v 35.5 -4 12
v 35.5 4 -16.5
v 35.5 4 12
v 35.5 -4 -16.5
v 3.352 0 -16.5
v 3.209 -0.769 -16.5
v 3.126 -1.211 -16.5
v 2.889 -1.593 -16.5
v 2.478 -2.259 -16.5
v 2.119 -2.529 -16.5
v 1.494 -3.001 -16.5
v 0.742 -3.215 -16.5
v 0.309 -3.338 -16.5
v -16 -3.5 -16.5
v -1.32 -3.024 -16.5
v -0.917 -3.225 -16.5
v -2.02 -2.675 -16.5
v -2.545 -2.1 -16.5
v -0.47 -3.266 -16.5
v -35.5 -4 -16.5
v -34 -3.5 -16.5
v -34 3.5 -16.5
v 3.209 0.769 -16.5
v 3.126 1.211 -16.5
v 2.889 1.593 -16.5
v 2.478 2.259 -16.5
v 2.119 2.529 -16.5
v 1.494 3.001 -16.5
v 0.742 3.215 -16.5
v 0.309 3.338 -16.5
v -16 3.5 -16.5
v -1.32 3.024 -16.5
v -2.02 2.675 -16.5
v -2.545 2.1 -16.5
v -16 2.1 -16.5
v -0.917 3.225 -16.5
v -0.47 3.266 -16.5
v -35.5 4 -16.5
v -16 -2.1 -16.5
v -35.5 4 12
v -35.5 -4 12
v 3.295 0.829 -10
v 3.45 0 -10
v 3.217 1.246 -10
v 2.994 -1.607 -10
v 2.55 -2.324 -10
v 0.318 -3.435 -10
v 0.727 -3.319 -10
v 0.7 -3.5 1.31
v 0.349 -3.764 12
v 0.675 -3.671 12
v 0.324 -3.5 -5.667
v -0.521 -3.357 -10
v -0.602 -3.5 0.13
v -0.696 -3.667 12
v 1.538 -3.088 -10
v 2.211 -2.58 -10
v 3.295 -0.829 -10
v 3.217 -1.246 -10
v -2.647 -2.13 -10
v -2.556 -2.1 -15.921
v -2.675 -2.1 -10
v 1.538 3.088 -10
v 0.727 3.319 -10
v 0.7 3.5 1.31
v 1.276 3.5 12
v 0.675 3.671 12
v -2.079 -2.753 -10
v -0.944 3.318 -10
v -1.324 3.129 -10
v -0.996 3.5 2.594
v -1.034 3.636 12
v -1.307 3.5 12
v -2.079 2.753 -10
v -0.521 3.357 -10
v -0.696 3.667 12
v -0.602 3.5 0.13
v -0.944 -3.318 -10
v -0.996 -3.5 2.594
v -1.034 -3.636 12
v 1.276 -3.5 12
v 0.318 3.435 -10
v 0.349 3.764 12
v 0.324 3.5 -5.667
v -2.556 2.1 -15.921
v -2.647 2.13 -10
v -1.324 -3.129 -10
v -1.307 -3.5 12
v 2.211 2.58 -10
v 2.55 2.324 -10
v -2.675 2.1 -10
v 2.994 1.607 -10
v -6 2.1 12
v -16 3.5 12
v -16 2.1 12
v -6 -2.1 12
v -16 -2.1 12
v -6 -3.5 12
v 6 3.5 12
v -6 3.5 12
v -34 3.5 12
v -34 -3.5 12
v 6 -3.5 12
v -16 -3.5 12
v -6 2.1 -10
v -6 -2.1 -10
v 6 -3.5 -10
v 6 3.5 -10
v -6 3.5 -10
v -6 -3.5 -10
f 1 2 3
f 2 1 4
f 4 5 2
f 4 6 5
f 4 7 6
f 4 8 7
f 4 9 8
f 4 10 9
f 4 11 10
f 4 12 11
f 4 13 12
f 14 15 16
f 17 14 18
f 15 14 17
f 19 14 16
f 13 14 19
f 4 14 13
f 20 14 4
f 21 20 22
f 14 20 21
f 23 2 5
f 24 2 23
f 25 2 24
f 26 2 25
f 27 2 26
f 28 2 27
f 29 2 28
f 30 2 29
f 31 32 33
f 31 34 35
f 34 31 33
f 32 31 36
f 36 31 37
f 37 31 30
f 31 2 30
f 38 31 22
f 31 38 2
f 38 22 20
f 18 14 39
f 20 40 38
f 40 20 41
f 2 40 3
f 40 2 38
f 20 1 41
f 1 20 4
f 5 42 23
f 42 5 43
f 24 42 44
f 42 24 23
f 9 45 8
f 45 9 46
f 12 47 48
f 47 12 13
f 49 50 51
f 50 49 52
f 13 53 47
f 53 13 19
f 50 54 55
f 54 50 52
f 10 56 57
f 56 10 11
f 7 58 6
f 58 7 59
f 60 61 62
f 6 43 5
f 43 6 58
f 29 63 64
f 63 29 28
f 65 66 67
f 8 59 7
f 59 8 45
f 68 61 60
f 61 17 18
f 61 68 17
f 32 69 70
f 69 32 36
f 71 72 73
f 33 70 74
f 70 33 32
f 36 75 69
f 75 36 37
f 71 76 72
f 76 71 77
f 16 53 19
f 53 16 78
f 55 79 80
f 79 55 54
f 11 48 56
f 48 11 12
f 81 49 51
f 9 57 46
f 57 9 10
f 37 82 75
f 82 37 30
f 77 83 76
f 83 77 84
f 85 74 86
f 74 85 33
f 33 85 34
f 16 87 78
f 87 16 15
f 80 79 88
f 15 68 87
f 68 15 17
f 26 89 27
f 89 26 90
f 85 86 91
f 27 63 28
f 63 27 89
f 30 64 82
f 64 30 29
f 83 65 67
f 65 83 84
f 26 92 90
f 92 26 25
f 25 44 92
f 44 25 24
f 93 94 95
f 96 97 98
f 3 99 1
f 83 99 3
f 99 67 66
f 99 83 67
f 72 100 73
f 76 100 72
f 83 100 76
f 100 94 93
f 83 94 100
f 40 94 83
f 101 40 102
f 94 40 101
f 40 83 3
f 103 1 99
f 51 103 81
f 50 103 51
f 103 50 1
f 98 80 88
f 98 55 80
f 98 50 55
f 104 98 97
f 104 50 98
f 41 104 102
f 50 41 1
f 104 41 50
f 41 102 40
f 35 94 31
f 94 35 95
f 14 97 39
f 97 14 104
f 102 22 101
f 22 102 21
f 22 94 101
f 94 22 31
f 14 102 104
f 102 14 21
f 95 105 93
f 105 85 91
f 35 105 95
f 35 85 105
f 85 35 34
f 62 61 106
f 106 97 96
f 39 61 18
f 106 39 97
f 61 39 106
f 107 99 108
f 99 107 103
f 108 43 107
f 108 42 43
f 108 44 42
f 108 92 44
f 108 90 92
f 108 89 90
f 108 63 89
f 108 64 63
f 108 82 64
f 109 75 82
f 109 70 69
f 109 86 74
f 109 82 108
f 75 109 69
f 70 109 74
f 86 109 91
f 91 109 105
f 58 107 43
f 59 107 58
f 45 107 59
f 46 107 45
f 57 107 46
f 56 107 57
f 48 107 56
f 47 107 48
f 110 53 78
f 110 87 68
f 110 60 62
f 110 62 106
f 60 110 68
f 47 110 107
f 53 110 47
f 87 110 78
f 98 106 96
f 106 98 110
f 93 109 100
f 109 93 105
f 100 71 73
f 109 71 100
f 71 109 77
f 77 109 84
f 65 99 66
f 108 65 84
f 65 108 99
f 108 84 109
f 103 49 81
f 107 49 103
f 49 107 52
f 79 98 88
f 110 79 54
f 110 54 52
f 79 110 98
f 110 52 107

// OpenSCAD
/* [Global] */
// preview[view:north west, tilt:top]
/* [Bracket Arm] */
angle = 0; // [-90:90]
bracketLength = 20;
bracket = 1; //[0:Hide,1:Show]
bracketOffset = 0;
part = "Adapter"; // [Bracket:Modify Bracket,Adapter:Modify Adapter]

/* [Model Angle] */
//Rotate the model so it lays flay on the build surface
modelAngle = 0; // [360]
/* [USB End] */

//USB Port Sizes
usbCWidth = 7;
usbCLength = 12;
usbCHeight = 23;

/* [USB Cable] */

//USB Cable Sizes
usbCCableDiamiter = 4; // [2.0:8]
usbCCableShroudDiamiter = 10; // [2.0:11]

/* [Hidden] */
print_part();

module print_part() {
	if (part == "Bracket") {
		myBracket();
	} else if (part == "Adapter") {
		myAdapter();
	}
}


module myAdapter(){
    //Insert Body
    color("cyan",alpha=1)
    difference(){
        cube([71,8,33],center=true);
        cylinder(h=200, d1=usbCCableDiamiter+0.2 ,d2=usbCCableShroudDiamiter+0.2,center=true);
            
        //phone Insert
        translate([0,0,15])
            cube([72,8.2,6], center=true);

        //USB Insertion Port
        translate([-25,0,0])
            cube([18,7,34],center=true);
        
        //USB cable Insertion Port
        translate([-10,0,0])
            cube([20,usbCCableDiamiter+0.2,34], center = true);
        
        color("red")
        translate([0,0,13])
        cube([usbCLength,usbCWidth,usbCHeight*2],center=true);
    }
}

module myBracket() {
    //Mount for PH-1
    rotate([modelAngle,0,0]){
    cube([28,2.6,24.8], center=true);

    if (bracket){
        color("red"){
            if (angle >= 42)
                translate([-10.1,2,9.4])
                    rotate([angle,0,0])
                        cube([19.8, bracketLength,3], center=false);
            else if (angle <= 0) 
                translate([-10.1,-1,9.4])
                    rotate([angle,0,0])
                        cube([19.8, bracketLength,3], center=false);
            else
                translate([-10.1,1,9.4])
                    rotate([angle,0,0])
                        cube([19.8, bracketLength,3], center=false);
        }
    }

    //Holding nub
        color("blue"){
            translate([0,-1.5,-8])
            rotate([0,90,0])
            cylinder(h=1.9,r1=1,r2=1,center=true);
        }
    }
}
